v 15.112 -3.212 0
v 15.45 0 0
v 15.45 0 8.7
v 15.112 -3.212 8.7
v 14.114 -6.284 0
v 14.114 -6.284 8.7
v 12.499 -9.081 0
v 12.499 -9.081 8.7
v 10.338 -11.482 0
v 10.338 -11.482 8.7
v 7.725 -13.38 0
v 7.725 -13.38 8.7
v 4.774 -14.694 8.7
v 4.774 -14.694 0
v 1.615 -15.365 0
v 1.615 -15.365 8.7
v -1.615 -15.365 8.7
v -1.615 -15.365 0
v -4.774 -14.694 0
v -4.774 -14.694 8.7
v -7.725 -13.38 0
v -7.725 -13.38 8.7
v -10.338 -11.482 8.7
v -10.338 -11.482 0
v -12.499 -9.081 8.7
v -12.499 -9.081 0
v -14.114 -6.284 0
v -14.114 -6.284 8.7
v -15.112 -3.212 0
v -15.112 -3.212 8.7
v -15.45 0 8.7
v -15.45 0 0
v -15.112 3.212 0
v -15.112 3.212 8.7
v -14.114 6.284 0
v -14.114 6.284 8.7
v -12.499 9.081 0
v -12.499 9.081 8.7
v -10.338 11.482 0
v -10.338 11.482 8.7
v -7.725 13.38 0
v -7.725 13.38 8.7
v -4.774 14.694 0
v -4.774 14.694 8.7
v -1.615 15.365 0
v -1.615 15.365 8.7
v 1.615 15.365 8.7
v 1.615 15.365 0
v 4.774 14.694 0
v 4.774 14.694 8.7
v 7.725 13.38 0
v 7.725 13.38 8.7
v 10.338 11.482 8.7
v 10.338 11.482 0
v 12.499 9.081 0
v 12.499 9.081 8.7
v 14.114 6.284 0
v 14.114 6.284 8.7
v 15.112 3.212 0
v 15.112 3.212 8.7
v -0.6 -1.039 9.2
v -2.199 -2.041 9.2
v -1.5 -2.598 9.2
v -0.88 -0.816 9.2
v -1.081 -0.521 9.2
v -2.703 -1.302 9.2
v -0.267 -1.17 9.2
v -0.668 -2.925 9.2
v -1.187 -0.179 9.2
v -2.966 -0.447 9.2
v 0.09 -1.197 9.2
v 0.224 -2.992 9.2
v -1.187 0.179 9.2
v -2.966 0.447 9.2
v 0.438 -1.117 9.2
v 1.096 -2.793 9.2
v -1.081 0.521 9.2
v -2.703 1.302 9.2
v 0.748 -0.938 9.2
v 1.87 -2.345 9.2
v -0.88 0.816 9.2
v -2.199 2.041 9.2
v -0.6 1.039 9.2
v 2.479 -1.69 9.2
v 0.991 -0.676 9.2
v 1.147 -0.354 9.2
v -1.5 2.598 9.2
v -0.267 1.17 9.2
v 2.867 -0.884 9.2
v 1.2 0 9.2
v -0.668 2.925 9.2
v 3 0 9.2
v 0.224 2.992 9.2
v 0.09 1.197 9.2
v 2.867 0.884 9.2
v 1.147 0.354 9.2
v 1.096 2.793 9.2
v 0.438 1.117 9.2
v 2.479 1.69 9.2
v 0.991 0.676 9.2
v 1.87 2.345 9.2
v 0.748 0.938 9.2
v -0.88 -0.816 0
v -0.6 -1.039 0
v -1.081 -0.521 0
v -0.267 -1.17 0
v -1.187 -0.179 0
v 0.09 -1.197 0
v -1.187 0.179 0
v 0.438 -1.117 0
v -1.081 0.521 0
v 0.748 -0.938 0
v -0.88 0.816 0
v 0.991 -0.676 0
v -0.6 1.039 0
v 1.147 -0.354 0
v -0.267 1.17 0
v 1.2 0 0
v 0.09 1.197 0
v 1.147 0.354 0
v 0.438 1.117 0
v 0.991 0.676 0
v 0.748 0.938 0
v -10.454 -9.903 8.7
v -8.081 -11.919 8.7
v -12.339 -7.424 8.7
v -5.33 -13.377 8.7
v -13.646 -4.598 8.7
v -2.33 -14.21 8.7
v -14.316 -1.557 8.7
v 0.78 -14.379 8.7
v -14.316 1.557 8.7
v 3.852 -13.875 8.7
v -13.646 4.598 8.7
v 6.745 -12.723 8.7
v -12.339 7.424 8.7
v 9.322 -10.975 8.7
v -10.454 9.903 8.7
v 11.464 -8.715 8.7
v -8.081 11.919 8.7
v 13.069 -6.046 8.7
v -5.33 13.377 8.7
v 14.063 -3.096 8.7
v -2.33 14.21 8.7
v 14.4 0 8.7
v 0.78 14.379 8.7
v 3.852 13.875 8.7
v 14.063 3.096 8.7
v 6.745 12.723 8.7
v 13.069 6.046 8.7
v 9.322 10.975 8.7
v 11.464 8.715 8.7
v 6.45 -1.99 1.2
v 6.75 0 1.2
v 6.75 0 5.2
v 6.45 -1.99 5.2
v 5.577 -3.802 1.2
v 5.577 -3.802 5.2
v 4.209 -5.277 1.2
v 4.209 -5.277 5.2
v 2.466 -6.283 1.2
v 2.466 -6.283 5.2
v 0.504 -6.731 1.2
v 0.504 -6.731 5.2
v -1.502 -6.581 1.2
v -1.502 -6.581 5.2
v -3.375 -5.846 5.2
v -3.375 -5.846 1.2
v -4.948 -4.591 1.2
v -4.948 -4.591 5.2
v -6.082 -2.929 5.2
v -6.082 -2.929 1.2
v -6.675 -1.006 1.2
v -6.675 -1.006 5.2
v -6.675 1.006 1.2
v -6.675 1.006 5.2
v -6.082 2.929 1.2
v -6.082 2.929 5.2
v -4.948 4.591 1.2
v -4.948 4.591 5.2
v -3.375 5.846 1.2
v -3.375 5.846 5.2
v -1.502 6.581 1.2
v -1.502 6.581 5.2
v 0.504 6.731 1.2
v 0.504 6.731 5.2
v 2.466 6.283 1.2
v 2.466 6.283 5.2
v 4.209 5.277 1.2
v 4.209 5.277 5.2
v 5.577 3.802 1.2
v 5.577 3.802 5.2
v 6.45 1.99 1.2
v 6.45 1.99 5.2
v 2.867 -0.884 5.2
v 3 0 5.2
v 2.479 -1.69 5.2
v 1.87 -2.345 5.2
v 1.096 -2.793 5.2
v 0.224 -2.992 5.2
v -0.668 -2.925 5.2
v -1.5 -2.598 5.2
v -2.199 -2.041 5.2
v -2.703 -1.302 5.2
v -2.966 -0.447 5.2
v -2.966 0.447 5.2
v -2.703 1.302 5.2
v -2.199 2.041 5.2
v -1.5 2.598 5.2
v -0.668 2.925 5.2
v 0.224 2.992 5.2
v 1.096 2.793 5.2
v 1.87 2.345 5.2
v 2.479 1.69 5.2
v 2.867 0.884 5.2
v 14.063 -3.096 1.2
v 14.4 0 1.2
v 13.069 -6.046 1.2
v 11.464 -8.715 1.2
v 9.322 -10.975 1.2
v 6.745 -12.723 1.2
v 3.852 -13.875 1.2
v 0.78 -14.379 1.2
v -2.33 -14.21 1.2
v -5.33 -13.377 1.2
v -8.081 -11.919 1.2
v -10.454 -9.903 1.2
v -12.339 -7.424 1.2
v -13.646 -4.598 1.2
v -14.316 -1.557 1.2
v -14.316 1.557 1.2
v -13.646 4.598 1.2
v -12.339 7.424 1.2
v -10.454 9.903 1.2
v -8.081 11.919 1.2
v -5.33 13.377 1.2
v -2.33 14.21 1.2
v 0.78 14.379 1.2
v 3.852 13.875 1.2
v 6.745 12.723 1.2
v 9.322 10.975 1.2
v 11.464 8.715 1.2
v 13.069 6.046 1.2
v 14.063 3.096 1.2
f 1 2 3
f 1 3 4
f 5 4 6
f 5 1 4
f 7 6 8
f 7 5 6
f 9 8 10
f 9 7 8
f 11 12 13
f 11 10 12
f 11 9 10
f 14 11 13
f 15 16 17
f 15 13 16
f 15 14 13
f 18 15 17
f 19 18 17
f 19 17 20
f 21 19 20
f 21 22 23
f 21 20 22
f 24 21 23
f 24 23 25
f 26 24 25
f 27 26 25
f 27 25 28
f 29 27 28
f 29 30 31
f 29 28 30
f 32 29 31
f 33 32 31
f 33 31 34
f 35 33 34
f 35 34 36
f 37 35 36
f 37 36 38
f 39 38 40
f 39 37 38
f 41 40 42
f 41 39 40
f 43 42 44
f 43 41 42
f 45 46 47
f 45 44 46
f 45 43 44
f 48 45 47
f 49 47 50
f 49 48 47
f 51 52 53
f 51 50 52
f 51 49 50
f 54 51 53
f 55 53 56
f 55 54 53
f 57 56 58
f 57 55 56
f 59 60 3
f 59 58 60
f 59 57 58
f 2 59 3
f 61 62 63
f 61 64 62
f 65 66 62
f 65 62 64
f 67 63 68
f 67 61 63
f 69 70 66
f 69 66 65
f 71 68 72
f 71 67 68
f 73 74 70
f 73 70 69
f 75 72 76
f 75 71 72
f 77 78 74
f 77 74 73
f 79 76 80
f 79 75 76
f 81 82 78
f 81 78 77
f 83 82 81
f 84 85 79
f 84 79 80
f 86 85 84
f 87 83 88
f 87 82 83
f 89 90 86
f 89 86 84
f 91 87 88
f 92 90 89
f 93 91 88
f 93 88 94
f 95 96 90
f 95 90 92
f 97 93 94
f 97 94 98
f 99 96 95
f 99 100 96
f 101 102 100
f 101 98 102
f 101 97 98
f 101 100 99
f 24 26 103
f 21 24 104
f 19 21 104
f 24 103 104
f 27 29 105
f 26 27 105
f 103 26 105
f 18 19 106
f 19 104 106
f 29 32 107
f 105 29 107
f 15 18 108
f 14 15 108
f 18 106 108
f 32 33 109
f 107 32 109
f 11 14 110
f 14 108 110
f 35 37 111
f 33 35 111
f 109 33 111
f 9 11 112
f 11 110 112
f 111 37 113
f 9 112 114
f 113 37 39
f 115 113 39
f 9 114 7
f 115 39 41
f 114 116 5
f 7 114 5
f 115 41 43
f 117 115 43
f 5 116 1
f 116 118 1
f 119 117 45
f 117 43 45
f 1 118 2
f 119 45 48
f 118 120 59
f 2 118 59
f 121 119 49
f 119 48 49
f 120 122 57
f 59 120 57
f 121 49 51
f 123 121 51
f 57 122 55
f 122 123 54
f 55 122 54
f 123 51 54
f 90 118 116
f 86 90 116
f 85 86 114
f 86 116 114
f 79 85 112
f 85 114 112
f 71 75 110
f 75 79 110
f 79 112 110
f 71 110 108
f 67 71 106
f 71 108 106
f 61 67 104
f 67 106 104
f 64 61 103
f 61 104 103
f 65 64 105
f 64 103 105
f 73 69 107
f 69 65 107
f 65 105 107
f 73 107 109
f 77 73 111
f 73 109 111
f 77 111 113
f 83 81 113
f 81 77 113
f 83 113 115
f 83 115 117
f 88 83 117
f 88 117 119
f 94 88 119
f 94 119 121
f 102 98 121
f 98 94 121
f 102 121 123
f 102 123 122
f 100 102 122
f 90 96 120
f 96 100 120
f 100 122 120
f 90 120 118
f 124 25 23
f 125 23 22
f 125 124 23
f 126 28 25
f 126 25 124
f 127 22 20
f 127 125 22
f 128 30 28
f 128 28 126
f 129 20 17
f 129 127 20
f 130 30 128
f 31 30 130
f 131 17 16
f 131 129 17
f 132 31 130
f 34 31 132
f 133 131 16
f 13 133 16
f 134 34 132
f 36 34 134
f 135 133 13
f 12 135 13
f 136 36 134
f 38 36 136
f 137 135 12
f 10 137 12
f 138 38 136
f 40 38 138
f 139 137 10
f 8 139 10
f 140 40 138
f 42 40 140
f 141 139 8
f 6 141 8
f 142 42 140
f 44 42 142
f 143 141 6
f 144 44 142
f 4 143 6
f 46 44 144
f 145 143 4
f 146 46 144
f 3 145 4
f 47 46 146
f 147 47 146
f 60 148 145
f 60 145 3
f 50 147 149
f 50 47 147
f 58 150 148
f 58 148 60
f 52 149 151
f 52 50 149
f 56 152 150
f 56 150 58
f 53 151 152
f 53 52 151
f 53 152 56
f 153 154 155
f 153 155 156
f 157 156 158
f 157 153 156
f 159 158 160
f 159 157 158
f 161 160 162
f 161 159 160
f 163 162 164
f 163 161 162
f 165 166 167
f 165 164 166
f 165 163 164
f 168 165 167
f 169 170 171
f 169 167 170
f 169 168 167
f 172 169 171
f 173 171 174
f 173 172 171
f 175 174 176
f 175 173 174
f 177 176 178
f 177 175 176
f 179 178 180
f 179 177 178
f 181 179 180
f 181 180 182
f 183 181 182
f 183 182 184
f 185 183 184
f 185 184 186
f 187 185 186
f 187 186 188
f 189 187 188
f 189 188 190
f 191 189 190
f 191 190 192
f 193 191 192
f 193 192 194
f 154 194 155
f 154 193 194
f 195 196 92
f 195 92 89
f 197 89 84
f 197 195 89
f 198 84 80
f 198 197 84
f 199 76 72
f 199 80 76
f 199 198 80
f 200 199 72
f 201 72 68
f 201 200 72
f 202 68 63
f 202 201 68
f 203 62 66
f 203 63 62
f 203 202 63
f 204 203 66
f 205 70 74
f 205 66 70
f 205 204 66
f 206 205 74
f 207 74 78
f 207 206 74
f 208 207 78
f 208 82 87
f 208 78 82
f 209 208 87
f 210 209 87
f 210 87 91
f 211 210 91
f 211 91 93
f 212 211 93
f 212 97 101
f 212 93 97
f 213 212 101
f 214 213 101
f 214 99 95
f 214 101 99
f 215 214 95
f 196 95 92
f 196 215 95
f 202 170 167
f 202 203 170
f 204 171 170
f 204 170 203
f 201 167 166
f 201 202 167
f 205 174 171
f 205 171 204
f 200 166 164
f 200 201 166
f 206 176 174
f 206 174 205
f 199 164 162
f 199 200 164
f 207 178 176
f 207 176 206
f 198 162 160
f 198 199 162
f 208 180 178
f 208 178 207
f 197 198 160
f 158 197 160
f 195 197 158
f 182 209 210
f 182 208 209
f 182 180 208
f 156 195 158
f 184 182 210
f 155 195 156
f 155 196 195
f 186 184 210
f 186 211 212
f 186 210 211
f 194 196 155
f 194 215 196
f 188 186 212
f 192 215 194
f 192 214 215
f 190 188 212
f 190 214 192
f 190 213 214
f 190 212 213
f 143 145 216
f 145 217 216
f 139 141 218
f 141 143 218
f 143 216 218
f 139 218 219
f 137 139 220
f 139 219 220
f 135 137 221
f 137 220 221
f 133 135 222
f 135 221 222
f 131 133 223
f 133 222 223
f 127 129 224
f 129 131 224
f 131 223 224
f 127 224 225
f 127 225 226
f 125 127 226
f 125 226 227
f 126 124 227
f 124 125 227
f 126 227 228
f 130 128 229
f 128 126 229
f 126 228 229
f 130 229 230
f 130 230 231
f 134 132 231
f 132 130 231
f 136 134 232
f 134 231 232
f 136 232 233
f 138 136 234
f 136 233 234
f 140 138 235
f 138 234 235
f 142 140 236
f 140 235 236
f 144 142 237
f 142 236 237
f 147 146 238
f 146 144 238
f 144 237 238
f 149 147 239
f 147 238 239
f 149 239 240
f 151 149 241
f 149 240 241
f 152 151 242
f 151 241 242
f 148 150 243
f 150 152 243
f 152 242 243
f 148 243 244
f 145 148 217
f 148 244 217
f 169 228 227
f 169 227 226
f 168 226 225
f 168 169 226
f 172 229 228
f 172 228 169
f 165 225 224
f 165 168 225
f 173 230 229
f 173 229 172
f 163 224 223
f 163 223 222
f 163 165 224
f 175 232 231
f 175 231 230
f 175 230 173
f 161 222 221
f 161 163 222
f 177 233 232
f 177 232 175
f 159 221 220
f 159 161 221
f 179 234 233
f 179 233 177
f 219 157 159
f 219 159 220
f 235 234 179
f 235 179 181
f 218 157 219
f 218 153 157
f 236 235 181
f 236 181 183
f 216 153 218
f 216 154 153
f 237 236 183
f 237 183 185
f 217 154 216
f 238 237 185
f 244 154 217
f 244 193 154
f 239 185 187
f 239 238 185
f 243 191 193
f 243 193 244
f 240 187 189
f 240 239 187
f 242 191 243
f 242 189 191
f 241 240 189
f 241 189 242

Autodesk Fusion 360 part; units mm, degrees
sketch "Sketch1" plane through (0, 0, 0) normal (0, 0, 1) x (1, 0, 0)
  circle A0 centre (0, 0) radius 15.45
  circle A1 centre (0, 0) radius 14.4
  circle A2 centre (0, 0) radius 6.75
  circle A3 centre (0, 0) radius 3
  circle A4 centre (0, 0) radius 1.2
  dimension "d24" = 30.9
  dimension "d25" = 28.8
  dimension "d26" = 13.5
  dimension "d27" = 6
  dimension "d28" = 2.4
extrude "Extrude1" add sketch "Sketch1" along normal blind 1.2 contours A1 makes body 1
extrude "Extrude2" add sketch "Sketch1" along normal blind 8.7 contours A0 bodies 1
extrude "Extrude3" add sketch "Sketch1" along normal blind 9.2 separate body contours A3 makes body 2
extrude "Extrude4" add sketch "Sketch1" along normal blind 5.2 contours A2 bodies 1 2
equation "d25 = 30.9 mm - 2.1 mm"
equation "d35 = 9.2 mm - 4 mm"
